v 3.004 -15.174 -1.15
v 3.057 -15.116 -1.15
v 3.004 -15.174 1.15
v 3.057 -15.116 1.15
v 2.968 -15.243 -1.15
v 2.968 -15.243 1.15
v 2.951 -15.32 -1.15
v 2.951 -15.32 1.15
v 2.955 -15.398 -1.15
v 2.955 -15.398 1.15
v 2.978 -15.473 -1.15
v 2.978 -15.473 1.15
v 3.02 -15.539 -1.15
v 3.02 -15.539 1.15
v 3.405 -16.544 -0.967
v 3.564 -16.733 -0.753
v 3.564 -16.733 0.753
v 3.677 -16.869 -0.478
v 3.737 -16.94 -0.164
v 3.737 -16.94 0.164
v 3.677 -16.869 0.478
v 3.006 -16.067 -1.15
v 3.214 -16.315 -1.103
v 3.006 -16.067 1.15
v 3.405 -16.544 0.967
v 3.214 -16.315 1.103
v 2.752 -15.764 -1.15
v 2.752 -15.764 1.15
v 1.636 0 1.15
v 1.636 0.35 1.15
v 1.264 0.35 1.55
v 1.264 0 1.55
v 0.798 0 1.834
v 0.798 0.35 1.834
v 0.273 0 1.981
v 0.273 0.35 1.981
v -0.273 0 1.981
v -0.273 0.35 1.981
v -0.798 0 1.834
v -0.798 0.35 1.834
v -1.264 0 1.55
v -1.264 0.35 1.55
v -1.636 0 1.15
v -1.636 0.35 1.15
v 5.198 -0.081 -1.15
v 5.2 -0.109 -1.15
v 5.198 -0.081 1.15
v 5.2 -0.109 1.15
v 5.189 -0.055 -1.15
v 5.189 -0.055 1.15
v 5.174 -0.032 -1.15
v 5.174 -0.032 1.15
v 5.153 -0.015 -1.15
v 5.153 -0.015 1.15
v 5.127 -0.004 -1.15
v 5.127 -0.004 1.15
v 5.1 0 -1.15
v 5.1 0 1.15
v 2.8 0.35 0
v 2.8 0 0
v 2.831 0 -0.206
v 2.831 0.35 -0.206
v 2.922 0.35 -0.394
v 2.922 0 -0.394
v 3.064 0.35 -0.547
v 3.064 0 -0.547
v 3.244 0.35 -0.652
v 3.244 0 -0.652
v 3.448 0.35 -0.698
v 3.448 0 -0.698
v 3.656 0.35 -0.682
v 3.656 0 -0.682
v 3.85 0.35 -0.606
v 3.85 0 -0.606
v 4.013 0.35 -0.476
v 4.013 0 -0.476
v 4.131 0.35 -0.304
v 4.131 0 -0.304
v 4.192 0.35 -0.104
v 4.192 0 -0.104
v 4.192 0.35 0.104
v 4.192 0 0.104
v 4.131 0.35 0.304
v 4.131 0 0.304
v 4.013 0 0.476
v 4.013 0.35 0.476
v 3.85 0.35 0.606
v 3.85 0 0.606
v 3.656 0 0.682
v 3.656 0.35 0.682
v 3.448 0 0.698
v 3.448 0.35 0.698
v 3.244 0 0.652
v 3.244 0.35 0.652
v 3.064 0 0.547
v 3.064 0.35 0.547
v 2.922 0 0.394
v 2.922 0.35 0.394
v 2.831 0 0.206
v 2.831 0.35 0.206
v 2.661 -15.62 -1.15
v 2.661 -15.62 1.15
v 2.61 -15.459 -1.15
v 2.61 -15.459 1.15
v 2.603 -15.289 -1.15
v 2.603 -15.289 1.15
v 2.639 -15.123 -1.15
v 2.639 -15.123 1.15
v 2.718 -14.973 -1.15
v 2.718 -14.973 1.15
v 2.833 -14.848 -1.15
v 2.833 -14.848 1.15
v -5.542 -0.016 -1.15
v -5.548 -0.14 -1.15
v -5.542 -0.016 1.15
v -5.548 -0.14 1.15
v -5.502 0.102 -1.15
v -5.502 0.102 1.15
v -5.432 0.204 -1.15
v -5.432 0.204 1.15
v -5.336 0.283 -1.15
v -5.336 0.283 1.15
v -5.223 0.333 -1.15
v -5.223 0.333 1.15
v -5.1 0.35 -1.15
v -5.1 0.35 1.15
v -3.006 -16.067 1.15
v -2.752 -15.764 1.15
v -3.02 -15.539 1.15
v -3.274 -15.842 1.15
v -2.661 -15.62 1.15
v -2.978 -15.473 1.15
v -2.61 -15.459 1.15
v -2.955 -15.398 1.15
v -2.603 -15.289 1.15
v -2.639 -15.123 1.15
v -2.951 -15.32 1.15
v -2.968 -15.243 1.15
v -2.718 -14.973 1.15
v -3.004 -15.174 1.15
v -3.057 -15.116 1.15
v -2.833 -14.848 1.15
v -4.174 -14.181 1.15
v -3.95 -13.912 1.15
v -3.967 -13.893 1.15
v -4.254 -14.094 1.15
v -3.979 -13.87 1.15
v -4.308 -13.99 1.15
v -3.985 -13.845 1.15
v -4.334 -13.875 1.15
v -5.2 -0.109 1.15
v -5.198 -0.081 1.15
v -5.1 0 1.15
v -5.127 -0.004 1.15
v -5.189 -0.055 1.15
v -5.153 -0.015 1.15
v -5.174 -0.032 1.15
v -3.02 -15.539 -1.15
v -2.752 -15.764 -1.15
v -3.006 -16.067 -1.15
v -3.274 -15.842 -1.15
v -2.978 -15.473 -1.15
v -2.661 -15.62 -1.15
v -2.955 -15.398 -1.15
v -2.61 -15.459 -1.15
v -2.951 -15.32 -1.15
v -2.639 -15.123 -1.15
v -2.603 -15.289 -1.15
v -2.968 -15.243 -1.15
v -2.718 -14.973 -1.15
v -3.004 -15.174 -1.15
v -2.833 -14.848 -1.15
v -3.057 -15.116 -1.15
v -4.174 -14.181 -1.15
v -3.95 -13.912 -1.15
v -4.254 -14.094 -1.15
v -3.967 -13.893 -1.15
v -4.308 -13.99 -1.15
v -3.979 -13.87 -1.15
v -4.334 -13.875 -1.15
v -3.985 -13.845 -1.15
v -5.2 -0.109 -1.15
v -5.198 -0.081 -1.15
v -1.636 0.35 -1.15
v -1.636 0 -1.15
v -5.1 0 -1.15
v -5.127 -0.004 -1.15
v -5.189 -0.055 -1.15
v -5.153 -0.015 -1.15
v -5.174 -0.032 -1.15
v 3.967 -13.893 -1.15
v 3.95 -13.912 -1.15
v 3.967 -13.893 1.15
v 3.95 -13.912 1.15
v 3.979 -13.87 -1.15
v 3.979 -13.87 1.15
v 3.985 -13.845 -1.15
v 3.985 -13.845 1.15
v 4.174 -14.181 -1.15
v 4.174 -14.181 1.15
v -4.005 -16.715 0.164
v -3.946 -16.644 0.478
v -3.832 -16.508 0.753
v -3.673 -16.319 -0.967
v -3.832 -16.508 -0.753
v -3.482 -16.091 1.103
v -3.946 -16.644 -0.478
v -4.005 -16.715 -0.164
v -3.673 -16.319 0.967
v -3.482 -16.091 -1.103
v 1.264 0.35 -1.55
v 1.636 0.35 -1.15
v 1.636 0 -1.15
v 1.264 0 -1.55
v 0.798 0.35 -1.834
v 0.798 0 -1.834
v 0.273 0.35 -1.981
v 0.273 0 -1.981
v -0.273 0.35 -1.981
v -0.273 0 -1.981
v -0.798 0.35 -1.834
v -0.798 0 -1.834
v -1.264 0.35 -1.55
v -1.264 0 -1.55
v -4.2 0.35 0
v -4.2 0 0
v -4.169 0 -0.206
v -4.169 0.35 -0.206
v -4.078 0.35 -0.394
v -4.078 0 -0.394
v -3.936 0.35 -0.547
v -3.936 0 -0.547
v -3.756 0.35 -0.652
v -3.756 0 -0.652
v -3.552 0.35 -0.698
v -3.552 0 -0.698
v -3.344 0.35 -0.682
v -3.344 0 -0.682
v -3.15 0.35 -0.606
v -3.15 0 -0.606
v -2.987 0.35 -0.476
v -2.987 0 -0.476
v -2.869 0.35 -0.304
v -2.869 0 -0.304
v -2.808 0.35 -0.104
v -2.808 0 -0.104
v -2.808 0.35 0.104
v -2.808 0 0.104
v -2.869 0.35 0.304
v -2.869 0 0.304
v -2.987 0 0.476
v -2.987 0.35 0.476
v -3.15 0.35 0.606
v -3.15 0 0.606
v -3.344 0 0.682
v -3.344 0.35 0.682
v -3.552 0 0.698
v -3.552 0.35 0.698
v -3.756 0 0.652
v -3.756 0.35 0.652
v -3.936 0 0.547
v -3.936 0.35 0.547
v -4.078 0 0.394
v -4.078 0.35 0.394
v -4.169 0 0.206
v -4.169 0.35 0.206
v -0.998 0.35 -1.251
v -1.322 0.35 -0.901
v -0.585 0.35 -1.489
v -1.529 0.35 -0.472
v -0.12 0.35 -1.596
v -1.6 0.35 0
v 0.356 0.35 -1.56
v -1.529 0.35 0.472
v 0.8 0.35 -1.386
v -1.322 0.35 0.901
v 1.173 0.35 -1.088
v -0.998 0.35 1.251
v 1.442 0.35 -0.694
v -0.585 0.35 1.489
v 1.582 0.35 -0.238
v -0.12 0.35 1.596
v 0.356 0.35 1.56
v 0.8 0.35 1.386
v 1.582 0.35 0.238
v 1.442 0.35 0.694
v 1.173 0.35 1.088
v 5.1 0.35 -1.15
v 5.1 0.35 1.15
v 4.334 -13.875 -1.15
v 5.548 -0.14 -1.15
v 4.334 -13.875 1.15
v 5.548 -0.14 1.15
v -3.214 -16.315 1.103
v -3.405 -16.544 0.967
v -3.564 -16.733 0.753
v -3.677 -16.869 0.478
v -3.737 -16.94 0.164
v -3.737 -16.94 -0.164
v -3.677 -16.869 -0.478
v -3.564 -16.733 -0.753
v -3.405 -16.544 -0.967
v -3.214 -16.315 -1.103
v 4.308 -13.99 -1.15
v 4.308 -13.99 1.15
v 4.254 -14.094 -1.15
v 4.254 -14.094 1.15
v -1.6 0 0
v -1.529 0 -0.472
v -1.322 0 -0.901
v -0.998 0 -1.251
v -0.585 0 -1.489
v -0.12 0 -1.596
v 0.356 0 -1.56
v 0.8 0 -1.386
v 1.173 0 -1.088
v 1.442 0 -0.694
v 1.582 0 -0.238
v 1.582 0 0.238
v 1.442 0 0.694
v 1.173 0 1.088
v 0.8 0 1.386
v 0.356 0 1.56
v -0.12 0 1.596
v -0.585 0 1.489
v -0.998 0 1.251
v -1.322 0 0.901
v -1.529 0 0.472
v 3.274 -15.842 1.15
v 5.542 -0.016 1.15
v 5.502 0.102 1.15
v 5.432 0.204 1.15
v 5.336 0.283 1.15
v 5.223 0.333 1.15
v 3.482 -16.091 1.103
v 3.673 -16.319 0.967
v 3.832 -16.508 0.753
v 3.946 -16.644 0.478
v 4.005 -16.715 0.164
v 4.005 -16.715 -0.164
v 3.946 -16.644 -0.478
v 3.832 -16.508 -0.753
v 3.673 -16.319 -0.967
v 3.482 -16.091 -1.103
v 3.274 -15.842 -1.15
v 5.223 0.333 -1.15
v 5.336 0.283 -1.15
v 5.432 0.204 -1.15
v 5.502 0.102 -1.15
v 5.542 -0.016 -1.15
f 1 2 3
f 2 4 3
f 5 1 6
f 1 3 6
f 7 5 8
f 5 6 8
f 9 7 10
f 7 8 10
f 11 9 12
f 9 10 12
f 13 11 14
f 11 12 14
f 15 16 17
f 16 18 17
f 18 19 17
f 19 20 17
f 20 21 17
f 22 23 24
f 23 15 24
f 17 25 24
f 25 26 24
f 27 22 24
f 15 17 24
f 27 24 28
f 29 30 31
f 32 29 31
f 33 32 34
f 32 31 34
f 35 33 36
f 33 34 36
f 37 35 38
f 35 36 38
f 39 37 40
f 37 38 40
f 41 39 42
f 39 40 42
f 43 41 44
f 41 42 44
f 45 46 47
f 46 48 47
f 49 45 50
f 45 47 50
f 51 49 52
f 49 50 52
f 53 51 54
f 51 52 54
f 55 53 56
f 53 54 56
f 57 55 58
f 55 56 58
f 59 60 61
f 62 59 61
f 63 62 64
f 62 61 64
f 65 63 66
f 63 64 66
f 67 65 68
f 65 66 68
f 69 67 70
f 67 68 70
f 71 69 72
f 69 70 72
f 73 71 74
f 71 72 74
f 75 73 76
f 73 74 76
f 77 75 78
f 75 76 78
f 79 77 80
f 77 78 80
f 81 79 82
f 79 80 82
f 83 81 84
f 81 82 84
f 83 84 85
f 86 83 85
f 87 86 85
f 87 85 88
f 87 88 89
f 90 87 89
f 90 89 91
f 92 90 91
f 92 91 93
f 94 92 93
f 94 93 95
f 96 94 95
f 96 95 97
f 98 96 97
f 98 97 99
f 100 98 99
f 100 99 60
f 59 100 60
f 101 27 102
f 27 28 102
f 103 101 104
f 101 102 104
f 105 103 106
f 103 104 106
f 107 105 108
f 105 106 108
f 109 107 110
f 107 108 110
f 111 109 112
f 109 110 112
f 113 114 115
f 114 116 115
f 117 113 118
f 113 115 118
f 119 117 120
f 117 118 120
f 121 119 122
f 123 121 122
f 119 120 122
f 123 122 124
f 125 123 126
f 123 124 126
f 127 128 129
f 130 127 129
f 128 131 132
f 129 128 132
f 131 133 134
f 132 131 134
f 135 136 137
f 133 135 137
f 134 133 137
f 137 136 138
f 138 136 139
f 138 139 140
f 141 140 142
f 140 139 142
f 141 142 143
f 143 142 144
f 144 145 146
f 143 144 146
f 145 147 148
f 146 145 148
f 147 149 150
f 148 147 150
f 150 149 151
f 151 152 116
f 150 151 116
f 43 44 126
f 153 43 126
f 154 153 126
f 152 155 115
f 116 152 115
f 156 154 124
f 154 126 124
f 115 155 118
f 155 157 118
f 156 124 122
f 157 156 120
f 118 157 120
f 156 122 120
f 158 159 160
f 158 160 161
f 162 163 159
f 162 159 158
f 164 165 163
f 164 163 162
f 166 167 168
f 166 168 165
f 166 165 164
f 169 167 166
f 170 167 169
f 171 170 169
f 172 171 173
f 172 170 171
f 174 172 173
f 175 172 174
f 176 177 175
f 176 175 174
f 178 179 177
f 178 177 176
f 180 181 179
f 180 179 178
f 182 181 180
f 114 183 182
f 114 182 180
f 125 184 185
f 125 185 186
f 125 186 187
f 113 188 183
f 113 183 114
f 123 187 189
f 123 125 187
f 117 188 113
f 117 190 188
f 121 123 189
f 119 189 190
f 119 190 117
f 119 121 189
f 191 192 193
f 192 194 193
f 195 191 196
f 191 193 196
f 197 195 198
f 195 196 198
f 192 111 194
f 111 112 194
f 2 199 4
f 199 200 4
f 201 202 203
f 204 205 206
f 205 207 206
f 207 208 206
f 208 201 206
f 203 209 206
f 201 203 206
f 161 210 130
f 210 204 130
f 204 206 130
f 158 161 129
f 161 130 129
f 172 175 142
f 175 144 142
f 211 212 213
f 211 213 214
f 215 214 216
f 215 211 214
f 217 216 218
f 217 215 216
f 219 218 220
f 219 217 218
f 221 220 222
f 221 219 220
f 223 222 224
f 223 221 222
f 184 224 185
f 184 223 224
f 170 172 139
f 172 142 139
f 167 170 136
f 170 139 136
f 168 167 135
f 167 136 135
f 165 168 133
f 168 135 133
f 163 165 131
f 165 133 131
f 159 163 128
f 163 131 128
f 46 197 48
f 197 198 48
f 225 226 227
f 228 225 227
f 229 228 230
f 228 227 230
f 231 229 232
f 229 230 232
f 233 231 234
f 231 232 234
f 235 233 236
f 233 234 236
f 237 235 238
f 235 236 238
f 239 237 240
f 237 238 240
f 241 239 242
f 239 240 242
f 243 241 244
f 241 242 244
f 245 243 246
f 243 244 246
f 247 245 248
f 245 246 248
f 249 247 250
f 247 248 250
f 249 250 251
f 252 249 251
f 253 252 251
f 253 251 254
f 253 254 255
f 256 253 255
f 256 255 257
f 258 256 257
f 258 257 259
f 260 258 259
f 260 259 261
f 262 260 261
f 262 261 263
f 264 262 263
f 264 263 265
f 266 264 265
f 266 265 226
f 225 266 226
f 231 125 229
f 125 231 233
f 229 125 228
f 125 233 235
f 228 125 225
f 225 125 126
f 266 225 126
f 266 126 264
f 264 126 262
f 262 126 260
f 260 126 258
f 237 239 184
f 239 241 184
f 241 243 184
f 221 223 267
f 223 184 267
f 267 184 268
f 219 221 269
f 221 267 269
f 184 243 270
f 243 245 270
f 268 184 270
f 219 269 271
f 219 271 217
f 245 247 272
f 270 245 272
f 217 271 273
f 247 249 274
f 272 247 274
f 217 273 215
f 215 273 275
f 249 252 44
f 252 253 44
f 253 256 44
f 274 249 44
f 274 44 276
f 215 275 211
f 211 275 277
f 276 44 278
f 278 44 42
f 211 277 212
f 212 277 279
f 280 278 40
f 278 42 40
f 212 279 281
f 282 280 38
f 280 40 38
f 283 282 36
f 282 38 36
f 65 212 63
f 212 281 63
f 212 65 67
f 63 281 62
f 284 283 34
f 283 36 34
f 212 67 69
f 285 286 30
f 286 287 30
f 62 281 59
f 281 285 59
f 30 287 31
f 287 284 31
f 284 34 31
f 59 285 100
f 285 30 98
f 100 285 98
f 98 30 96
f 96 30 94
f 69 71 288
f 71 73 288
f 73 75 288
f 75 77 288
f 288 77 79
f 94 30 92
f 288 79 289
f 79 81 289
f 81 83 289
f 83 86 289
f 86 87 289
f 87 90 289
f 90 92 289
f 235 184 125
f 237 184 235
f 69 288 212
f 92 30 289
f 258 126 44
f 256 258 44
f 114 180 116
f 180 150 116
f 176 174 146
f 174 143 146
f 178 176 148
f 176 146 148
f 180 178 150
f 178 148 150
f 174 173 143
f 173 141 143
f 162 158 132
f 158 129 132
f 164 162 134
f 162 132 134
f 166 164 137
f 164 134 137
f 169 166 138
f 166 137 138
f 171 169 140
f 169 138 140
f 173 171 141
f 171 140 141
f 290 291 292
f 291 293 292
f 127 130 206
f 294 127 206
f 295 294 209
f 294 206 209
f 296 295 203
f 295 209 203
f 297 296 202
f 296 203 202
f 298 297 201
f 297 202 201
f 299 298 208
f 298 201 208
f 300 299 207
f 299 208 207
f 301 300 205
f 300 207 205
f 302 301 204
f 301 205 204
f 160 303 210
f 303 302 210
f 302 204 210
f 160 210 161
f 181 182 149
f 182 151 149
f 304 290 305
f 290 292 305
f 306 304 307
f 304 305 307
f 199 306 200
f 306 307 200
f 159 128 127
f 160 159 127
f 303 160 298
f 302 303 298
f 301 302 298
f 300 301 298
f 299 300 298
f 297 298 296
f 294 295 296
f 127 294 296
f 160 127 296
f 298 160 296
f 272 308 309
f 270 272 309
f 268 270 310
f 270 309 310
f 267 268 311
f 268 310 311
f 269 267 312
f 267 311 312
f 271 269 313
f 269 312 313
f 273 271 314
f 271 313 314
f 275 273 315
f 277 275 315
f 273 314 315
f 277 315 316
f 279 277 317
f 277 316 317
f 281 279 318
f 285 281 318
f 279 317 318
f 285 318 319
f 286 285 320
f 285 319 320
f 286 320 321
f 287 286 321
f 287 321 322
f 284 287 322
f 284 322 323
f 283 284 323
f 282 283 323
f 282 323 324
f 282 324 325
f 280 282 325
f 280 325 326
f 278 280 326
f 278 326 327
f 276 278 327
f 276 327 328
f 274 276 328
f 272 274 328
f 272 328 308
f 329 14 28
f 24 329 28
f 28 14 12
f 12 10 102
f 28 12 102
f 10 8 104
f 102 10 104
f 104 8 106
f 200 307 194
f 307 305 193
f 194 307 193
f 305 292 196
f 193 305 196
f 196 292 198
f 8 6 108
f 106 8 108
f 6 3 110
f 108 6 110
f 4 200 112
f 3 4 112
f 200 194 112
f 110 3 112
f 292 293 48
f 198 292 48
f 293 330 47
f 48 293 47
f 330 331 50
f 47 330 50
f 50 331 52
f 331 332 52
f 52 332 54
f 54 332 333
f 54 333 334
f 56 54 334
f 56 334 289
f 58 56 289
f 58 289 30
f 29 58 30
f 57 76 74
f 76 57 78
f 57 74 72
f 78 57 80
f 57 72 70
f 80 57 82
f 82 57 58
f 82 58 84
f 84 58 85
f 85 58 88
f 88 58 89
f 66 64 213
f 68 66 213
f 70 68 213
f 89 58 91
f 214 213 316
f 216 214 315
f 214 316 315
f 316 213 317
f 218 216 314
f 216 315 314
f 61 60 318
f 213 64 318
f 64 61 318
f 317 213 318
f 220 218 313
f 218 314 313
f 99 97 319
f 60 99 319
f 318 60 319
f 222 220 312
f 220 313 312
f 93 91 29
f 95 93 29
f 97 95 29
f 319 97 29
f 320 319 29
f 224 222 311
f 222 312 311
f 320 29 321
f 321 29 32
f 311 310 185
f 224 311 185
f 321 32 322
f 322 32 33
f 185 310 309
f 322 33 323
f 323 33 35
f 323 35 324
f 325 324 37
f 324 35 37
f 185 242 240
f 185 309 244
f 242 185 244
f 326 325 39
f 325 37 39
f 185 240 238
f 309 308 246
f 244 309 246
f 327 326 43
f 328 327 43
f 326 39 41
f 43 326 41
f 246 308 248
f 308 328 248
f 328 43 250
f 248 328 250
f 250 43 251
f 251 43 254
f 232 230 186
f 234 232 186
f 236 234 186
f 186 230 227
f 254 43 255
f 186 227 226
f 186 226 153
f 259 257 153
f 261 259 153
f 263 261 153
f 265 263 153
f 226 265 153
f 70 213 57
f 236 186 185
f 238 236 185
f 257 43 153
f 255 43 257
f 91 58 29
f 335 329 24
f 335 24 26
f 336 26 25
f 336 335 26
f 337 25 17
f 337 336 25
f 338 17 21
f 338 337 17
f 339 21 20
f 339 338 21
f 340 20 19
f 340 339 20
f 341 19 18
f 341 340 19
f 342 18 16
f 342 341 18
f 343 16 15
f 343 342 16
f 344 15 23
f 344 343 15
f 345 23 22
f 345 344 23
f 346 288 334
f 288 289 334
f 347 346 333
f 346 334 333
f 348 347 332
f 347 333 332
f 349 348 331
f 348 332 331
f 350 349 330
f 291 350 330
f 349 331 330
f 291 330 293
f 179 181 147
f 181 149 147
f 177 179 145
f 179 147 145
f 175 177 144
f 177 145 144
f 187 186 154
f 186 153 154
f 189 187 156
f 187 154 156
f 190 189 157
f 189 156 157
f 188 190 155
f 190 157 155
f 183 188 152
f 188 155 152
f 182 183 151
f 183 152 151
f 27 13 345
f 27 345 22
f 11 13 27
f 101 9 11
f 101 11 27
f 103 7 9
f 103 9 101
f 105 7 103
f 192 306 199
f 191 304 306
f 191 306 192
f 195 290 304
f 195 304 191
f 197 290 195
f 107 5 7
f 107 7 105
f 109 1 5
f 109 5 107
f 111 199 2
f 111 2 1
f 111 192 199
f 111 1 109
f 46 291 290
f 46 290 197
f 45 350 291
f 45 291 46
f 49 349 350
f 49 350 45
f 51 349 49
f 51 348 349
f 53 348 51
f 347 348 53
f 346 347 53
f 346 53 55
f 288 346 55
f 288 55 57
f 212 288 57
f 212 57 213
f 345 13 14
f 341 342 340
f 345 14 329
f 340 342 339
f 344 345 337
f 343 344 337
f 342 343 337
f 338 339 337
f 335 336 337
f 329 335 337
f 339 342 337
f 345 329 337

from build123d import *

# Parameters (mm, degrees)
BASE_FLANGE1_DEPTH             = 1.15
TAB1_DEPTH                     = 0.35
F_3_2_3_2_DIAMETER_HOLE1_D     = 3.2
F_1_4_1_4_DIAMETER_HOLE1_D     = 1.4
F_1_4_1_4_DIAMETER_HOLE1_DEPTH = 0.35
CUT_EXTRUDE1_DEPTH             = 10


# Sheet-metal steps are written as plain solids
with BuildPart() as part:
    # Sketch80 → Base-Flange1 (new, symmetric)
    with BuildSketch(Plane.XY):
        with BuildLine():
            Line((3.744076121, -16.948565679), (2.751685988, -15.763663573))
            ThreePointArc((2.751685988, -15.763663573), (2.602525969, -15.289062626), (2.832647456, -14.847997018))
            Line((2.832647456, -14.847997018), (3.949719342, -13.912416676))
            ThreePointArc((3.949719342, -13.912416676), (3.974169718, -13.88200963), (3.985122647, -13.844560429))
            Line((3.985122647, -13.844560429), (5.199611389, -0.108807447))
            ThreePointArc((5.199611389, -0.108807447), (5.17375888, -0.032474985), (5.1, 0))
            Line((5.1, 0), (-5.1, 0))
            ThreePointArc((-5.1, 0), (-5.17375888, -0.032474985), (-5.199611389, -0.108807447))
            Line((-5.199611389, -0.108807447), (-3.985122647, -13.844560429))
            ThreePointArc((-3.985122647, -13.844560429), (-3.974169718, -13.88200963), (-3.949719342, -13.912416676))
            Line((-3.949719342, -13.912416676), (-2.832647456, -14.847997018))
            ThreePointArc((-2.832647456, -14.847997018), (-2.602525969, -15.289062626), (-2.751685988, -15.763663573))
            Line((-2.751685988, -15.763663573), (-3.744076121, -16.948565679))
            Line((-3.744076121, -16.948565679), (-4.01239905, -16.723837386))
            Line((-4.01239905, -16.723837386), (-3.020008918, -15.53893528))
            ThreePointArc((-3.020008918, -15.53893528), (-2.951165832, -15.319888689), (-3.057375749, -15.116319947))
            Line((-3.057375749, -15.116319947), (-4.174447634, -14.180739606))
            ThreePointArc((-4.174447634, -14.180739606), (-4.284474328, -14.043907898), (-4.33376251, -13.875386492))
            Line((-4.33376251, -13.875386492), (-5.548251252, -0.13963351))
            ThreePointArc((-5.548251252, -0.13963351), (-5.431914959, 0.203862568), (-5.1, 0.35))
            Line((-5.1, 0.35), (5.1, 0.35))
            ThreePointArc((5.1, 0.35), (5.431914959, 0.203862568), (5.548251252, -0.13963351))
            Line((5.548251252, -0.13963351), (4.33376251, -13.875386492))
            ThreePointArc((4.33376251, -13.875386492), (4.284474328, -14.043907898), (4.174447634, -14.180739606))
            Line((4.174447634, -14.180739606), (3.057375749, -15.116319947))
            ThreePointArc((3.057375749, -15.116319947), (2.951165832, -15.319888689), (3.020008918, -15.53893528))
            Line((3.020008918, -15.53893528), (4.01239905, -16.723837386))
            Line((4.01239905, -16.723837386), (3.744076121, -16.948565679))
        make_face()
    extrude(amount=BASE_FLANGE1_DEPTH, both=True)

    # Sketch81 → Tab1 (add)
    with BuildSketch(Plane(origin=(0, 0.35, 0), x_dir=(1, 0, 0), z_dir=(0, 1, 0))):
        with BuildLine():
            Line((-1.636306817, 1.15), (1.636306817, 1.15))
            ThreePointArc((1.636306817, 1.15), (0, 2), (-1.636306817, 1.15))
        make_face()
        with BuildLine():
            Line((-1.636306817, -1.15), (1.636306817, -1.15))
            ThreePointArc((1.636306817, -1.15), (0, -2), (-1.636306817, -1.15))
        make_face()
    extrude(amount=-TAB1_DEPTH)

    # Ø3.2 (3.2) Diameter Hole1 (through all)
    with Locations(Plane(origin=(0, 0.35, 0), x_dir=(1, 0, 0), z_dir=(0, 1, 0))):
        with Locations((0, 0)):
            Hole(F_3_2_3_2_DIAMETER_HOLE1_D / 2)

    # Ø1.4 (1.4) Diameter Hole1
    with Locations(Plane(origin=(0, 0.35, 0), x_dir=(1, 0, 0), z_dir=(0, 1, 0))):
        with Locations((-3.5, 0), (3.5, 0)):
            Hole(F_1_4_1_4_DIAMETER_HOLE1_D / 2, depth=F_1_4_1_4_DIAMETER_HOLE1_DEPTH)

    # Sketch90 → Cut-Extrude1 (cut)
    with BuildSketch(Plane(origin=(-5.873973903, -4.919624761, 0), x_dir=(0, 0, -1), z_dir=(0.7666369409597348, 0.6420808366209819, 0))):
        with BuildLine():
            Line((-1.15, -15.897396074), (-1.15, -14.247396074))
            ThreePointArc((-1.15, -14.247396074), (0, -15.397396074), (1.15, -14.247396074))
            Line((1.15, -14.247396074), (1.15, -15.897396074))
            Line((1.15, -15.897396074), (-1.15, -15.897396074))
        make_face()
    cut_extrude1 = extrude(amount=-CUT_EXTRUDE1_DEPTH, mode=Mode.SUBTRACT)

    # Mirror1: Cut-Extrude1 across plane
    add(cut_extrude1.mirror(Plane(origin=(0, 0, 0), x_dir=(0, 0, 1), z_dir=(1, 0, 0))), mode=Mode.SUBTRACT)


solid = part.part
